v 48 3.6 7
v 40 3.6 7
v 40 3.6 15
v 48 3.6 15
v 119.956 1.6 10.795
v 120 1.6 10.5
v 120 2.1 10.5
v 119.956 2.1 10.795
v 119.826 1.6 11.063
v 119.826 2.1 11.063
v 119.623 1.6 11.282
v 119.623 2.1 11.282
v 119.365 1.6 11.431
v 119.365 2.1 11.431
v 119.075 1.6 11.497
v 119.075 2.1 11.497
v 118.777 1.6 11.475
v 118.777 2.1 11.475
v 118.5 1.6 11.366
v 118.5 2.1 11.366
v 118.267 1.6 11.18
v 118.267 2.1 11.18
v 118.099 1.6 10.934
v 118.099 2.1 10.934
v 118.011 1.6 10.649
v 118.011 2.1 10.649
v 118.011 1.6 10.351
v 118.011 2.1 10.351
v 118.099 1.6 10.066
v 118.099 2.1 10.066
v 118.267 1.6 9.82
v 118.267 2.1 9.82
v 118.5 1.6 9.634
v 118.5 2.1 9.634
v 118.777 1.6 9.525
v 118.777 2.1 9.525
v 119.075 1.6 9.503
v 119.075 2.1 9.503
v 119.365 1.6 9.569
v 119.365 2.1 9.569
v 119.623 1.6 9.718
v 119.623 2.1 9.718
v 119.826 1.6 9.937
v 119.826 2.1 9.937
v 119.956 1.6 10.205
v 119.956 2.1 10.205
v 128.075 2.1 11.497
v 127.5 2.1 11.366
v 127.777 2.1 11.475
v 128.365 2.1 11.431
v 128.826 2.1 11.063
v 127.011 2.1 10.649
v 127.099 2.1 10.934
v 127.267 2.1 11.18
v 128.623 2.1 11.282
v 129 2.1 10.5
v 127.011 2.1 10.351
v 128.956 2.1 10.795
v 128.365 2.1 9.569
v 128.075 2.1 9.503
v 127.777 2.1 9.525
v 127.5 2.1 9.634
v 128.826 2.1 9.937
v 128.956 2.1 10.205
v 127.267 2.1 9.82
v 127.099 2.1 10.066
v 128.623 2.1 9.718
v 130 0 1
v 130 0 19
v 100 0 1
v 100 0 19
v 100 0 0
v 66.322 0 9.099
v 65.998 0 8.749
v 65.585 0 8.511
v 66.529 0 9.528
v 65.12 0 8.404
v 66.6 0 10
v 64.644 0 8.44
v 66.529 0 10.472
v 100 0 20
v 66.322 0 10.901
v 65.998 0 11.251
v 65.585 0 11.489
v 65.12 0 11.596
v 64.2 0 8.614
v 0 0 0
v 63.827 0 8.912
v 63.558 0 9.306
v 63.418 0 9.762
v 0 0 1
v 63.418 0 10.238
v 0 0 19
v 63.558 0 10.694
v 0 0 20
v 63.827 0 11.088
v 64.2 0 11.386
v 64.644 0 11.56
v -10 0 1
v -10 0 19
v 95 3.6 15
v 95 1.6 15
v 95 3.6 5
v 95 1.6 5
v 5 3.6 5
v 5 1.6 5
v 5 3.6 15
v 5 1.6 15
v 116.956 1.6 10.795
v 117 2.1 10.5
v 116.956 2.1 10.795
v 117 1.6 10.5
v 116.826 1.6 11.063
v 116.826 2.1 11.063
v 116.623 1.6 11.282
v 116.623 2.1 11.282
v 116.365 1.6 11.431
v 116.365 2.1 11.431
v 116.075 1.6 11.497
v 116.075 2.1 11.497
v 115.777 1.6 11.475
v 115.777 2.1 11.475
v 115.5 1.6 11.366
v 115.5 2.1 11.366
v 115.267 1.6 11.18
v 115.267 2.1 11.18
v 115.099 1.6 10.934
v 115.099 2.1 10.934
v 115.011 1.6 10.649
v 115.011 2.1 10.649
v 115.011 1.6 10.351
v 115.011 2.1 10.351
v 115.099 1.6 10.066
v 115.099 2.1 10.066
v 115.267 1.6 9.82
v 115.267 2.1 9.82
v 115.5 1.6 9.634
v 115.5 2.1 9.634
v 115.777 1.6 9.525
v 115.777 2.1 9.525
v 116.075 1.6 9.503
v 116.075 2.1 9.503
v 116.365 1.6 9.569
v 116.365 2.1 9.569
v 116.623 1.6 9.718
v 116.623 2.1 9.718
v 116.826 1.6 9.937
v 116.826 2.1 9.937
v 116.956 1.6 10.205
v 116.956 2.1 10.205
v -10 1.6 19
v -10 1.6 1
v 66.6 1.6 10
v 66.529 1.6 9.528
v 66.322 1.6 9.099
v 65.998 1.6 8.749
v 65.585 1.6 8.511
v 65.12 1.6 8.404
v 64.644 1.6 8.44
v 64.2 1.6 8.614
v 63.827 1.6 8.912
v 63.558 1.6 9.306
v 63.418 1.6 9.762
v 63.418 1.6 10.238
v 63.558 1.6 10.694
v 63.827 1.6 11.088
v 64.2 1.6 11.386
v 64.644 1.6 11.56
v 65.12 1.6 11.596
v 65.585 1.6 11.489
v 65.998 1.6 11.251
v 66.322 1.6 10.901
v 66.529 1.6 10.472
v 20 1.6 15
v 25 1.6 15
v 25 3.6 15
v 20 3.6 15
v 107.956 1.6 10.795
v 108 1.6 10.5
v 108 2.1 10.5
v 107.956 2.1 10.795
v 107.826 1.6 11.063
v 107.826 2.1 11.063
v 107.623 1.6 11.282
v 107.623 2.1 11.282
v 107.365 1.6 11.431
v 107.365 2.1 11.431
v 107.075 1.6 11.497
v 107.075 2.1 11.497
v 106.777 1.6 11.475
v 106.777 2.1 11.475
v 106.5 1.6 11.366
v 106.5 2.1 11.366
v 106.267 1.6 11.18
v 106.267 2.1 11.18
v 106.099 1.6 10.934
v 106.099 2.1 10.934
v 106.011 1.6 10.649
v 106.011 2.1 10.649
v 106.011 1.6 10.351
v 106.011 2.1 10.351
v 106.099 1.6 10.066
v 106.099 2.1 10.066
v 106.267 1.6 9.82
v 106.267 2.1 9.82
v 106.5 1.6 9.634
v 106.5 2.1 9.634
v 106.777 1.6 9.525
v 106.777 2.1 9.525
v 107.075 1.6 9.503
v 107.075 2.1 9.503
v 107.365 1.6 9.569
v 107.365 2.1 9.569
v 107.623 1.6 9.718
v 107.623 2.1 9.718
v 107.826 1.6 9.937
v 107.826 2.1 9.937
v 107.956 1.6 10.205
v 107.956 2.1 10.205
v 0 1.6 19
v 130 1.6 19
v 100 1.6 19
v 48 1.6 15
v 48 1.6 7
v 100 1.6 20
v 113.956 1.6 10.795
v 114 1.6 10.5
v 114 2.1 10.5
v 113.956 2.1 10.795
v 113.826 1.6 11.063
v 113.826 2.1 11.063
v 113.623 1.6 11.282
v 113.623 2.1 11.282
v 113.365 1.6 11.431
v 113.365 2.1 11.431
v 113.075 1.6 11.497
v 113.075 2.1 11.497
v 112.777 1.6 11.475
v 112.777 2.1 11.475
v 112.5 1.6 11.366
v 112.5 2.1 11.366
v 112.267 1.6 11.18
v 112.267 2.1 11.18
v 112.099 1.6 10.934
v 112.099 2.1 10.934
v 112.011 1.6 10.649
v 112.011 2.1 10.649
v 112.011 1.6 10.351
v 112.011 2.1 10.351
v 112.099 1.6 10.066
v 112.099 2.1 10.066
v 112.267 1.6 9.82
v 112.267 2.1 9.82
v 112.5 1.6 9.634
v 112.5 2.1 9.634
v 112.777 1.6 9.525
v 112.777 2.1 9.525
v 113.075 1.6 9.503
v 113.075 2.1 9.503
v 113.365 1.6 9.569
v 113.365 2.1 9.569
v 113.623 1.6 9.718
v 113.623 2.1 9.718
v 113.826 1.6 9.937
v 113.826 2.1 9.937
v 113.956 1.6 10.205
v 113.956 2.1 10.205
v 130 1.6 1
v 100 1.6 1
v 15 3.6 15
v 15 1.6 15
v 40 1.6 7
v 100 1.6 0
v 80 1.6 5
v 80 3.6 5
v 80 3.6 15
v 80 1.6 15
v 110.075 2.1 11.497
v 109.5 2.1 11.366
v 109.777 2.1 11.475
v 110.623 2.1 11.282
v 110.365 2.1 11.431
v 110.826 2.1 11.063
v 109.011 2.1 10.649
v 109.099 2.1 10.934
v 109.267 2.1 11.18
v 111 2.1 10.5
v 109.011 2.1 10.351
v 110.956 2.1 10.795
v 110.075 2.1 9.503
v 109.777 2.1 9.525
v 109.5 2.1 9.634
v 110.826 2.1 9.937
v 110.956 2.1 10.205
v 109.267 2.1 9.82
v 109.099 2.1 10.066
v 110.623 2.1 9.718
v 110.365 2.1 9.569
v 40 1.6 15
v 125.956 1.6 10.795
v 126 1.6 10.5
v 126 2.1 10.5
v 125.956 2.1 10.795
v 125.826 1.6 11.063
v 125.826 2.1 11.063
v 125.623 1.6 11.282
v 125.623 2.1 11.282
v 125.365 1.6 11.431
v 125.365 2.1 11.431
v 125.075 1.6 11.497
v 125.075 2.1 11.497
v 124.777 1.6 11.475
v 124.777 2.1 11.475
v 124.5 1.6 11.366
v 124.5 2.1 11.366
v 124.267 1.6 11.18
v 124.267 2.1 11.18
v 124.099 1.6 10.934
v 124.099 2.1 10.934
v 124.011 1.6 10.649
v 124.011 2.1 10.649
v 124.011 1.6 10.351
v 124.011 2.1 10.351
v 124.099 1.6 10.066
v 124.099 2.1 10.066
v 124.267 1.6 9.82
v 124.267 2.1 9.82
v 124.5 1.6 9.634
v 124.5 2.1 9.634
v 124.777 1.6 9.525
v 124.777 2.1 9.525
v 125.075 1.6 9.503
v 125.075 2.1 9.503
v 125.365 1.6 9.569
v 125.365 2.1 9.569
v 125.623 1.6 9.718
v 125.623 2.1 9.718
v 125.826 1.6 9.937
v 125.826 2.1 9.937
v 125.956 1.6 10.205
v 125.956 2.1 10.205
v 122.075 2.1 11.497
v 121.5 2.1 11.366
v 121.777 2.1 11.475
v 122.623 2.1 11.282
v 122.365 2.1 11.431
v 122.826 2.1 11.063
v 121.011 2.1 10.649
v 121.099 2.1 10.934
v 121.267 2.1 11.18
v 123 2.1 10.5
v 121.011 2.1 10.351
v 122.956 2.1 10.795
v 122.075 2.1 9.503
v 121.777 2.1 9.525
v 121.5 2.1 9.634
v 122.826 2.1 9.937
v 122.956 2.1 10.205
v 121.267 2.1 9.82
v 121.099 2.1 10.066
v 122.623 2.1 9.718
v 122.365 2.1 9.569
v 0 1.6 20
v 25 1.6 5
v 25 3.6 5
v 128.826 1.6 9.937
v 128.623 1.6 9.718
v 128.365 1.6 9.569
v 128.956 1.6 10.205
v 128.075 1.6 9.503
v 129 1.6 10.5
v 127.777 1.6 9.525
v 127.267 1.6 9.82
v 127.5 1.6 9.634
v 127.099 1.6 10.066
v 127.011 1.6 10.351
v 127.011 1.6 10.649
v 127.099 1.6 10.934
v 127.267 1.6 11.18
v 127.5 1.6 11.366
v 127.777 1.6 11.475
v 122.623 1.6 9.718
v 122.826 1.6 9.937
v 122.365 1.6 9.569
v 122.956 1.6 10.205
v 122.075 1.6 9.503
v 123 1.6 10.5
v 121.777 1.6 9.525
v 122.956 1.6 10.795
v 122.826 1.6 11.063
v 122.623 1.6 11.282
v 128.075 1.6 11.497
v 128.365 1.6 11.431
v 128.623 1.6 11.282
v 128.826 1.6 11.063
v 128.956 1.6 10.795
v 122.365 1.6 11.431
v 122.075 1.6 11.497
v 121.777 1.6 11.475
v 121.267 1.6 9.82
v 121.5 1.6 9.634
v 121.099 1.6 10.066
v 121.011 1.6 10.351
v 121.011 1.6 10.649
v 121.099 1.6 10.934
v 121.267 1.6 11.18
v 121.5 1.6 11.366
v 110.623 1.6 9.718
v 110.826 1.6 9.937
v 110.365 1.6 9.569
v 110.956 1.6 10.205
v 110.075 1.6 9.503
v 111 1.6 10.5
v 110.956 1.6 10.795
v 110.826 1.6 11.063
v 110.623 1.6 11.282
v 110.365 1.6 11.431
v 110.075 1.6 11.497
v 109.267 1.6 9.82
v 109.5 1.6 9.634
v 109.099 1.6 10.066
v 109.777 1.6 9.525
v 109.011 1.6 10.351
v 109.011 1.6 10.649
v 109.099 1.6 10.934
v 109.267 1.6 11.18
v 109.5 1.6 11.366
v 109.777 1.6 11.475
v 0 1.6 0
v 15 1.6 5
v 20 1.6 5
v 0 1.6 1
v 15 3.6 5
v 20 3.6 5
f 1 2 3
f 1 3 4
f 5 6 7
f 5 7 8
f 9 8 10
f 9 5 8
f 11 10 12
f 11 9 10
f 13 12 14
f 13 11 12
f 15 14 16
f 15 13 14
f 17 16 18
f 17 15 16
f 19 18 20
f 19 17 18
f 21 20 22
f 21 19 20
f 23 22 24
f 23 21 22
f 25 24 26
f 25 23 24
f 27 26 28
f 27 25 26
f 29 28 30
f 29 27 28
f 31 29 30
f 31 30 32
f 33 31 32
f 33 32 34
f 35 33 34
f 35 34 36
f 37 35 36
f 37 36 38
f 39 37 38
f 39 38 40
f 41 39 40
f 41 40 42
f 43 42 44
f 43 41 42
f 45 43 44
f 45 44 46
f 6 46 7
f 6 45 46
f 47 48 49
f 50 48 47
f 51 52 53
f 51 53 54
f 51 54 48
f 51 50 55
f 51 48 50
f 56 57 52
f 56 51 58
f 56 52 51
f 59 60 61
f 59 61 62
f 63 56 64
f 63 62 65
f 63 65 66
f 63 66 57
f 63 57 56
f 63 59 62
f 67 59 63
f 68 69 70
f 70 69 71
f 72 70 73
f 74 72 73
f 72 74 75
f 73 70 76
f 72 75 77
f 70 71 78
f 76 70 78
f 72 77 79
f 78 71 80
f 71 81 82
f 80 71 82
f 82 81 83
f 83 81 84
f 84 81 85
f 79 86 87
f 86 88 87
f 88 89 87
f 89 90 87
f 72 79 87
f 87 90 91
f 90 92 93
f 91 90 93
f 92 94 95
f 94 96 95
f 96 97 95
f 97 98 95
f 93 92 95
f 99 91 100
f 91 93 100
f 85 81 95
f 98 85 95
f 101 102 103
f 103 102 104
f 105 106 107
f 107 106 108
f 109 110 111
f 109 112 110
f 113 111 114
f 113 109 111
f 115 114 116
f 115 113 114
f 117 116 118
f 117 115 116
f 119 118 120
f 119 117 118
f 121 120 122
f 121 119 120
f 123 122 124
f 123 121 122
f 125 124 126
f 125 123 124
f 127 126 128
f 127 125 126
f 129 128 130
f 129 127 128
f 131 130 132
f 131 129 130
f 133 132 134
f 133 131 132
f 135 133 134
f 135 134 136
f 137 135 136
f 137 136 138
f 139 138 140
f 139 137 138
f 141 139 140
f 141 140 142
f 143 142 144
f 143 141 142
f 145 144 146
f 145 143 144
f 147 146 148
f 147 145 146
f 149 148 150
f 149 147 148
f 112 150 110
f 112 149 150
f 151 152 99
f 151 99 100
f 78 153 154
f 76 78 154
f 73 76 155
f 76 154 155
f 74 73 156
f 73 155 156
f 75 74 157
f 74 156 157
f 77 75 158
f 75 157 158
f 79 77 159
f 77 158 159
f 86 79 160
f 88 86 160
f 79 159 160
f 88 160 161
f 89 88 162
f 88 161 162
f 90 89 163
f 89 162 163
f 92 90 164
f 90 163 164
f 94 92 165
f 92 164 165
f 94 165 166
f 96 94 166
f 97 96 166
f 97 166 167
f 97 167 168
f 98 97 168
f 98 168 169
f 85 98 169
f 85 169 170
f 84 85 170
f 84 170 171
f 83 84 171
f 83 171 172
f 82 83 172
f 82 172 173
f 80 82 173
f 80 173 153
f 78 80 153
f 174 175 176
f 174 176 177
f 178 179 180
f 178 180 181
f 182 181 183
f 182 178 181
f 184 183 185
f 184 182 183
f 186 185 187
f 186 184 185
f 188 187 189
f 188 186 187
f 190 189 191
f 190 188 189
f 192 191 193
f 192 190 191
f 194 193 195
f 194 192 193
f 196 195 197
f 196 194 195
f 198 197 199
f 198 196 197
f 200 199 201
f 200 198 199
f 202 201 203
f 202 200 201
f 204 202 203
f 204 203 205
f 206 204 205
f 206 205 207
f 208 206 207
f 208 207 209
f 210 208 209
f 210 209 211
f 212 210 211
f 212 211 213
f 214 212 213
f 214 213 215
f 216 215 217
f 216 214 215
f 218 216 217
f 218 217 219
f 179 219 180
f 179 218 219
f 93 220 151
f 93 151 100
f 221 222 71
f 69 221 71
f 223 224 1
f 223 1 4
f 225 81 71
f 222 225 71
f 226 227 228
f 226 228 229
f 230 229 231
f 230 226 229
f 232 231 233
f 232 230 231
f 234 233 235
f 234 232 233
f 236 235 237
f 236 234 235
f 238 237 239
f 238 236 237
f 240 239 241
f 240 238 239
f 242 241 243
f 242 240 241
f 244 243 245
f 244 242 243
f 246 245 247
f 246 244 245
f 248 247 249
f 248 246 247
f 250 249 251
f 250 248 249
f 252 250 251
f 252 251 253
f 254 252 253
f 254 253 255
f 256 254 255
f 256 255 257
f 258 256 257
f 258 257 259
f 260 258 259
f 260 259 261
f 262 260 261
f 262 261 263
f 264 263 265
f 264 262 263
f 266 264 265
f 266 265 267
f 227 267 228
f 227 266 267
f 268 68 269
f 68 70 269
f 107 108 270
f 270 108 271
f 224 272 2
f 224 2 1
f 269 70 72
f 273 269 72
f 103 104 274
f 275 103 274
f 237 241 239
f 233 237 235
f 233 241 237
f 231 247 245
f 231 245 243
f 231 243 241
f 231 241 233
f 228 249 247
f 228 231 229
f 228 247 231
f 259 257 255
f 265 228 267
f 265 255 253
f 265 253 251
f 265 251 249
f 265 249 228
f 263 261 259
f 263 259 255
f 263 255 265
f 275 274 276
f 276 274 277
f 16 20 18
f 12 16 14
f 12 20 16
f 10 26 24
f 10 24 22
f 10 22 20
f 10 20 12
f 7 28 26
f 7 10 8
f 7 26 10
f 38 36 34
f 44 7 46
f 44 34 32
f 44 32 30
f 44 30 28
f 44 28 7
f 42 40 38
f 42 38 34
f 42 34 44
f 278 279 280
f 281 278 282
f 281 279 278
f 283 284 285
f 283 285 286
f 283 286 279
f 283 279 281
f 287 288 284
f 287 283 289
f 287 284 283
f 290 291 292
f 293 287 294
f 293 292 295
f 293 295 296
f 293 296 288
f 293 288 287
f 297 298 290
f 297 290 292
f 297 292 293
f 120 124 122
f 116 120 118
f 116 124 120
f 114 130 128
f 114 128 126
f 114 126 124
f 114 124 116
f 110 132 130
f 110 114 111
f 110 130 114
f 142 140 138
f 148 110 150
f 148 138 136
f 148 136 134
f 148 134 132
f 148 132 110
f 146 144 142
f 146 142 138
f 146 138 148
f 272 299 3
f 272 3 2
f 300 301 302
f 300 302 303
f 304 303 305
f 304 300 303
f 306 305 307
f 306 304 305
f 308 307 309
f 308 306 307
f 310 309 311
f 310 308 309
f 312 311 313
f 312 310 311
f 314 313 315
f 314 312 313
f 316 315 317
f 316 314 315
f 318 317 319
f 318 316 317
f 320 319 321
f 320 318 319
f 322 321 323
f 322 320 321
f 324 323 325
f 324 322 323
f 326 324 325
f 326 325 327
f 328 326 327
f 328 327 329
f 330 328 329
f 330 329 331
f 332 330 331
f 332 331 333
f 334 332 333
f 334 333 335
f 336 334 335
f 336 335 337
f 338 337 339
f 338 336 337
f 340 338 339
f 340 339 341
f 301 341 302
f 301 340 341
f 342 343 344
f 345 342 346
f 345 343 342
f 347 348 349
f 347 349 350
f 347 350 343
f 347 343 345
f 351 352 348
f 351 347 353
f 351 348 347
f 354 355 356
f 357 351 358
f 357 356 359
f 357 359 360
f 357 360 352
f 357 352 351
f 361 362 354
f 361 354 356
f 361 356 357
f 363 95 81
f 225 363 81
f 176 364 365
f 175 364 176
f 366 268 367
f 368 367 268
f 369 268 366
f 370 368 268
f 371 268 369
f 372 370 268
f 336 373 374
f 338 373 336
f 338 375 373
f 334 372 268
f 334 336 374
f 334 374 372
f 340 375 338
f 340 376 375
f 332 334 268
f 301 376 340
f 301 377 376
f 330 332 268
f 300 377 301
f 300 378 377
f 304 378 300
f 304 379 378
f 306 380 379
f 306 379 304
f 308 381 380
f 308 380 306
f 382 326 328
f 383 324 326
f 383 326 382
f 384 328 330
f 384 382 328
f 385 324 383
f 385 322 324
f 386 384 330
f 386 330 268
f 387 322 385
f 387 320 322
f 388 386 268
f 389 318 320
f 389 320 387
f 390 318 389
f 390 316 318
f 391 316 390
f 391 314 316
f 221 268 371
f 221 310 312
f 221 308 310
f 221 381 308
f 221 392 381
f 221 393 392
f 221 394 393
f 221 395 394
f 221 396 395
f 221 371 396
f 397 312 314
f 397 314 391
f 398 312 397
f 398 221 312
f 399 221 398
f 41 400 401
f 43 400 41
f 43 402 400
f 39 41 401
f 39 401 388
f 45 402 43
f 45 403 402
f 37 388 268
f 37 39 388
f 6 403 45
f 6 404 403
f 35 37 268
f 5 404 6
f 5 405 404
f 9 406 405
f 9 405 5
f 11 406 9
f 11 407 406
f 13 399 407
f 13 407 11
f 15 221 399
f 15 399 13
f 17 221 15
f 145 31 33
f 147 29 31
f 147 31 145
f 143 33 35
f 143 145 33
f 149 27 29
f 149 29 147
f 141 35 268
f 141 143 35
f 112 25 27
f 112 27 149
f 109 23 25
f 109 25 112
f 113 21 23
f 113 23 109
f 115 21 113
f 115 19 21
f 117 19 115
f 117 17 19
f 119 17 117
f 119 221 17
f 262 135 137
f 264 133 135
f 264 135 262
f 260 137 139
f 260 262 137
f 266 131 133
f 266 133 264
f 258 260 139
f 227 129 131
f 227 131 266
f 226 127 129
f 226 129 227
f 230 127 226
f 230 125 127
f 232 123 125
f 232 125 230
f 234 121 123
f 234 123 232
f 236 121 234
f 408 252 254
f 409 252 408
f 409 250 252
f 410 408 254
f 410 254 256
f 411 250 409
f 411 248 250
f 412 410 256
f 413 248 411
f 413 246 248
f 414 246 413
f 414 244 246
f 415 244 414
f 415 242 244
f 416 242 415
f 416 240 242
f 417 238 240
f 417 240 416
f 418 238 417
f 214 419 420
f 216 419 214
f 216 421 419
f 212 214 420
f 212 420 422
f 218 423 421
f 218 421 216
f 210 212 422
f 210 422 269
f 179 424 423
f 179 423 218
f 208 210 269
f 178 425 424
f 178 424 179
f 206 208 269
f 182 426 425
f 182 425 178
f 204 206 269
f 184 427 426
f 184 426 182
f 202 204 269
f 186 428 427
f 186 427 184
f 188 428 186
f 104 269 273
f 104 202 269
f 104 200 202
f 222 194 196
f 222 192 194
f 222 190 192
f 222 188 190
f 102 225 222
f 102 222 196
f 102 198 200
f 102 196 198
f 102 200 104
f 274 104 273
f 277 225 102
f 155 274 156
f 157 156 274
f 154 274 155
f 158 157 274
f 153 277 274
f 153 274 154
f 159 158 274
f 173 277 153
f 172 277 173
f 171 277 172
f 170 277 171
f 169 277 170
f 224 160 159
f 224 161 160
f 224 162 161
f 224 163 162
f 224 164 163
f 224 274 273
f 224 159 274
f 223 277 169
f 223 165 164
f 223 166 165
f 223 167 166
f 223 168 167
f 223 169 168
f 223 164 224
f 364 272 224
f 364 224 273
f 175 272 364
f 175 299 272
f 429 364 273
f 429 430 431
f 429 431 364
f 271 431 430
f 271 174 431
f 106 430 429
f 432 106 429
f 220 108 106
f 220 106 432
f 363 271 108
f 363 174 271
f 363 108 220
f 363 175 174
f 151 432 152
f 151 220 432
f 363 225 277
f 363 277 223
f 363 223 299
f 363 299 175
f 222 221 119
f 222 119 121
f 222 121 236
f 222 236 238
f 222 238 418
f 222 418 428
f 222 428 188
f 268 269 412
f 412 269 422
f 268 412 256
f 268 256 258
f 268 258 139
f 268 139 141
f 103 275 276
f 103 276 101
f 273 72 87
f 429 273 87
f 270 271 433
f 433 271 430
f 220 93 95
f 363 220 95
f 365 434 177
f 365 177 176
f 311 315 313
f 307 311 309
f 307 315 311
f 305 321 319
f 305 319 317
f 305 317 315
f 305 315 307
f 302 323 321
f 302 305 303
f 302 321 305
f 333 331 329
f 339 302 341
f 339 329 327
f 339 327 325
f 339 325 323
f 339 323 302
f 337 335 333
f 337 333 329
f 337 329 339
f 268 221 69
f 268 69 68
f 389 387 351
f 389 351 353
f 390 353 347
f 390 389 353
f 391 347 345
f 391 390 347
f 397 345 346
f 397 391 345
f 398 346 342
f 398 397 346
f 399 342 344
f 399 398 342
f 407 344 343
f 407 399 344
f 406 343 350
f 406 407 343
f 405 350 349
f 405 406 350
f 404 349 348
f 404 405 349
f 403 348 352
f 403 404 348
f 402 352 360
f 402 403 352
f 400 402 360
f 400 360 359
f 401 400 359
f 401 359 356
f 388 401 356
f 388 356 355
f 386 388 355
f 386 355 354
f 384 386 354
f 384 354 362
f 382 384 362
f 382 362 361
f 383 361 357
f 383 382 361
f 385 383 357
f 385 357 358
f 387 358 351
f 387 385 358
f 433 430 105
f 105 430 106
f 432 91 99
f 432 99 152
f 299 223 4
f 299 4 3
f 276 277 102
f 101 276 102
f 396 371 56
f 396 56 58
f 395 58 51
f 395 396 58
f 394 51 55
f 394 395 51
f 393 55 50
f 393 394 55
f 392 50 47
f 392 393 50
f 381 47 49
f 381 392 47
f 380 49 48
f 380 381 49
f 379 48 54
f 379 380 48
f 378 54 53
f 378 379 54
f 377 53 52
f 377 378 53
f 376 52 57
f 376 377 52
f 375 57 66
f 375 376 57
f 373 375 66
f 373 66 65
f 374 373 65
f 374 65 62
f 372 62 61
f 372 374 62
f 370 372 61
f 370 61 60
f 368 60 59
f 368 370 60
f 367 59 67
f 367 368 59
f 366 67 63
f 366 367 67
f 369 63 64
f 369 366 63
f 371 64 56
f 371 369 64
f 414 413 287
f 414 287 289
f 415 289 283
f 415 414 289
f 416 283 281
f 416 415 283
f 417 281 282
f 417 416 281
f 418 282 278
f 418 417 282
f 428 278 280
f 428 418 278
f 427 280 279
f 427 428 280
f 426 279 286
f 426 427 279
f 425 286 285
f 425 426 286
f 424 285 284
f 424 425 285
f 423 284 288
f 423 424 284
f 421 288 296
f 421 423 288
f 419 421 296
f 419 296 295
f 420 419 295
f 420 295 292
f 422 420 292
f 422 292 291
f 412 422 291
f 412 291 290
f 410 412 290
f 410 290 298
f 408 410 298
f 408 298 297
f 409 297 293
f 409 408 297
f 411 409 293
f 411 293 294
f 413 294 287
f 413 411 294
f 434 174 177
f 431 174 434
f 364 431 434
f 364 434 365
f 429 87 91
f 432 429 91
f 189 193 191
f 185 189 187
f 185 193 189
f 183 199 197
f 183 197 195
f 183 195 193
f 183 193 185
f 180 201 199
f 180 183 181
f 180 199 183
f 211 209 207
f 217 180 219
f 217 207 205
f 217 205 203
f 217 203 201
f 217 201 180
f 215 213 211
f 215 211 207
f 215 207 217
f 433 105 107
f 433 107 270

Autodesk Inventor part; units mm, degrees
ref_plane "YZ Plane" through (0, 0, 0) normal (1, 0, 0) x (0, 1, 0)
ref_plane "XZ Plane" through (0, 0, 0) normal (0, 1, 0) x (-1, 0, 0)
ref_plane "XY Plane" through (0, 0, 0) normal (0, 0, 1) x (1, 0, 0)
sketch "草图1" plane through (0, 0, 0) normal (0, 1, 0) x (-1, 0, 0)
  line L0 (0, 20) -> (-100, 20)
  line L1 (-100, 20) -> (-100, 0)
  line L2 (-100, 0) -> (0, 0)
  line L3 (0, 0) -> (0, 20)
  point P0 (0, 0)
  dimension "d0" = 20
  dimension "d1" = 100
extrude "拉伸1" add sketch "草图1" along normal blind 1.6
sketch "草图2" plane through (0, 1.6, 0) normal (0, 1, 0) x (1, 0, 0)
  line L0 (5, -15) -> (15, -15)
  line L1 (15, -15) -> (15, -5)
  line L2 (15, -5) -> (5, -5)
  line L3 (5, -5) -> (5, -15)
  line L4 (100, 0) -> (0, 0) projected
  line L5 (0, 0) -> (0, -20) projected
  point P0 (0, 0)
  dimension "d4" = 10
  dimension "d5" = 10
  dimension "d6" = 5
  dimension "d7" = 5
extrude "拉伸2" add sketch "草图2" along normal blind 2
sketch "草图3" plane through (0, 1.6, 0) normal (0, 1, 0) x (1, 0, 0)
  line L0 (80, -15) -> (95, -15)
  line L1 (95, -15) -> (95, -5)
  line L2 (95, -5) -> (80, -5)
  line L3 (80, -5) -> (80, -15)
  line L4 (100, 0) -> (0, 0) projected
  line L5 (100, -20) -> (100, 0) projected
  point P0 (0, 0)
  point P1 (100, -10)
  point P2 (95, -10)
  dimension "d10" = 10
  dimension "d11" = 15
  dimension "d12" = 5
  dimension "d13" = 5
extrude "拉伸3" add sketch "草图3" along normal blind 2
sketch "草图4" plane through (0, 1.6, 0) normal (0, 1, 0) x (1, 0, 0)
  line L0 (48, -15) -> (40, -15)
  line L1 (40, -15) -> (40, -7)
  line L2 (40, -7) -> (48, -7)
  line L3 (48, -7) -> (48, -15)
  line L4 (0, -20) -> (100, -20) projected
  line L5 (0, 0) -> (0, -20) projected
  point P0 (0, 0)
  point P1 (44, -15)
  dimension "d16" = 8
  dimension "d17" = 8
  dimension "d18" = 5
  dimension "d19" = 40
extrude "拉伸4" add sketch "草图4" along normal blind 2
sketch "草图5" plane through (0, 1.6, 0) normal (0, 1, 0) x (1, 0, 0)
  line L0 (25, -15) -> (20, -15)
  line L1 (20, -15) -> (20, -5)
  line L2 (20, -5) -> (25, -5)
  line L3 (25, -5) -> (25, -15)
  line L4 (0, -20) -> (100, -20) projected
  line L5 (0, 0) -> (0, -20) projected
  point P0 (0, 0)
  point P1 (20, -10)
  dimension "d22" = 5
  dimension "d23" = 10
  dimension "d24" = 5
  dimension "d25" = 20
extrude "拉伸5" add sketch "草图5" along normal blind 2
sketch "草图6" plane through (100, 0, 20) normal (1, 0, 0) x (0, 0, -1)
  point P0 (20, 0)
sketch "草图7" plane through (100, 0, 20) normal (1, 0, 0) x (0, 0, -1)
  line L0 (1, 0) -> (19, 0)
  line L1 (19, 0) -> (19, 1.6)
  line L2 (19, 1.6) -> (1, 1.6)
  line L3 (1, 1.6) -> (1, 0)
  line L4 (0, 0) -> (20, 0) projected
  line L5 (20, 0) -> (20, 1.6) projected
  point P0 (20, 0)
  point P1 (20, 0.8)
  dimension "d28" = 1.6
  dimension "d29" = 0
  dimension "d30" = 18
  dimension "d31" = 1
extrude "拉伸6" add sketch "草图7" along normal blind 30
sketch "草图8" plane through (0, 0, 0) normal (-1, 0, 0) x (0, 0, 1)
  line L0 (1, 1.6) -> (19, 1.6)
  line L1 (19, 1.6) -> (19, 0)
  line L2 (19, 0) -> (1, 0)
  line L3 (1, 0) -> (1, 1.6)
  line L4 (0, 0) -> (20, 0) projected
  line L5 (20, 0) -> (20, 1.6) projected
  point P0 (0, 0)
  dimension "d34" = 1.6
  dimension "d35" = 0
  dimension "d36" = 18
  dimension "d37" = 1
extrude "拉伸7" add sketch "草图8" along normal blind 10
sketch "草图9" plane through (0, 1.6, 0) normal (0, 1, 0) x (1, 0, 0)
  circle A0 centre (128, -10.5) radius 1
  line L0 (100, -1) -> (130, -1) projected
  line L1 (130, -1) -> (130, -19) projected
  circle A1 centre (125, -10.5) radius 1
  circle A2 centre (122, -10.5) radius 1
  circle A3 centre (119, -10.5) radius 1
  circle A4 centre (116, -10.5) radius 1
  circle A5 centre (113, -10.5) radius 1
  circle A6 centre (110, -10.5) radius 1
  circle A7 centre (107, -10.5) radius 1
  point P0 (0, 0)
  dimension "d40" = 2
  dimension "d41" = 9.5
  dimension "d42" = 2
  dimension "d45" = 3
extrude "拉伸8" add sketch "草图9" along normal blind 0.5
sketch "草图10" plane through (0, 1.6, 0) normal (0, 1, 0) x (1, 0, 0)
  circle A0 centre (65, -10) radius 1.6
  line L0 (100, 0) -> (0, 0) projected
  line L1 (0, 0) -> (0, -1) projected
  point P0 (0, -0.5)
  dimension "d52" = 3.2
  dimension "d53" = 10
  dimension "d54" = 65
extrude "拉伸9" cut sketch "草图10" against normal blind 1.6
properties part number "pcb板"
